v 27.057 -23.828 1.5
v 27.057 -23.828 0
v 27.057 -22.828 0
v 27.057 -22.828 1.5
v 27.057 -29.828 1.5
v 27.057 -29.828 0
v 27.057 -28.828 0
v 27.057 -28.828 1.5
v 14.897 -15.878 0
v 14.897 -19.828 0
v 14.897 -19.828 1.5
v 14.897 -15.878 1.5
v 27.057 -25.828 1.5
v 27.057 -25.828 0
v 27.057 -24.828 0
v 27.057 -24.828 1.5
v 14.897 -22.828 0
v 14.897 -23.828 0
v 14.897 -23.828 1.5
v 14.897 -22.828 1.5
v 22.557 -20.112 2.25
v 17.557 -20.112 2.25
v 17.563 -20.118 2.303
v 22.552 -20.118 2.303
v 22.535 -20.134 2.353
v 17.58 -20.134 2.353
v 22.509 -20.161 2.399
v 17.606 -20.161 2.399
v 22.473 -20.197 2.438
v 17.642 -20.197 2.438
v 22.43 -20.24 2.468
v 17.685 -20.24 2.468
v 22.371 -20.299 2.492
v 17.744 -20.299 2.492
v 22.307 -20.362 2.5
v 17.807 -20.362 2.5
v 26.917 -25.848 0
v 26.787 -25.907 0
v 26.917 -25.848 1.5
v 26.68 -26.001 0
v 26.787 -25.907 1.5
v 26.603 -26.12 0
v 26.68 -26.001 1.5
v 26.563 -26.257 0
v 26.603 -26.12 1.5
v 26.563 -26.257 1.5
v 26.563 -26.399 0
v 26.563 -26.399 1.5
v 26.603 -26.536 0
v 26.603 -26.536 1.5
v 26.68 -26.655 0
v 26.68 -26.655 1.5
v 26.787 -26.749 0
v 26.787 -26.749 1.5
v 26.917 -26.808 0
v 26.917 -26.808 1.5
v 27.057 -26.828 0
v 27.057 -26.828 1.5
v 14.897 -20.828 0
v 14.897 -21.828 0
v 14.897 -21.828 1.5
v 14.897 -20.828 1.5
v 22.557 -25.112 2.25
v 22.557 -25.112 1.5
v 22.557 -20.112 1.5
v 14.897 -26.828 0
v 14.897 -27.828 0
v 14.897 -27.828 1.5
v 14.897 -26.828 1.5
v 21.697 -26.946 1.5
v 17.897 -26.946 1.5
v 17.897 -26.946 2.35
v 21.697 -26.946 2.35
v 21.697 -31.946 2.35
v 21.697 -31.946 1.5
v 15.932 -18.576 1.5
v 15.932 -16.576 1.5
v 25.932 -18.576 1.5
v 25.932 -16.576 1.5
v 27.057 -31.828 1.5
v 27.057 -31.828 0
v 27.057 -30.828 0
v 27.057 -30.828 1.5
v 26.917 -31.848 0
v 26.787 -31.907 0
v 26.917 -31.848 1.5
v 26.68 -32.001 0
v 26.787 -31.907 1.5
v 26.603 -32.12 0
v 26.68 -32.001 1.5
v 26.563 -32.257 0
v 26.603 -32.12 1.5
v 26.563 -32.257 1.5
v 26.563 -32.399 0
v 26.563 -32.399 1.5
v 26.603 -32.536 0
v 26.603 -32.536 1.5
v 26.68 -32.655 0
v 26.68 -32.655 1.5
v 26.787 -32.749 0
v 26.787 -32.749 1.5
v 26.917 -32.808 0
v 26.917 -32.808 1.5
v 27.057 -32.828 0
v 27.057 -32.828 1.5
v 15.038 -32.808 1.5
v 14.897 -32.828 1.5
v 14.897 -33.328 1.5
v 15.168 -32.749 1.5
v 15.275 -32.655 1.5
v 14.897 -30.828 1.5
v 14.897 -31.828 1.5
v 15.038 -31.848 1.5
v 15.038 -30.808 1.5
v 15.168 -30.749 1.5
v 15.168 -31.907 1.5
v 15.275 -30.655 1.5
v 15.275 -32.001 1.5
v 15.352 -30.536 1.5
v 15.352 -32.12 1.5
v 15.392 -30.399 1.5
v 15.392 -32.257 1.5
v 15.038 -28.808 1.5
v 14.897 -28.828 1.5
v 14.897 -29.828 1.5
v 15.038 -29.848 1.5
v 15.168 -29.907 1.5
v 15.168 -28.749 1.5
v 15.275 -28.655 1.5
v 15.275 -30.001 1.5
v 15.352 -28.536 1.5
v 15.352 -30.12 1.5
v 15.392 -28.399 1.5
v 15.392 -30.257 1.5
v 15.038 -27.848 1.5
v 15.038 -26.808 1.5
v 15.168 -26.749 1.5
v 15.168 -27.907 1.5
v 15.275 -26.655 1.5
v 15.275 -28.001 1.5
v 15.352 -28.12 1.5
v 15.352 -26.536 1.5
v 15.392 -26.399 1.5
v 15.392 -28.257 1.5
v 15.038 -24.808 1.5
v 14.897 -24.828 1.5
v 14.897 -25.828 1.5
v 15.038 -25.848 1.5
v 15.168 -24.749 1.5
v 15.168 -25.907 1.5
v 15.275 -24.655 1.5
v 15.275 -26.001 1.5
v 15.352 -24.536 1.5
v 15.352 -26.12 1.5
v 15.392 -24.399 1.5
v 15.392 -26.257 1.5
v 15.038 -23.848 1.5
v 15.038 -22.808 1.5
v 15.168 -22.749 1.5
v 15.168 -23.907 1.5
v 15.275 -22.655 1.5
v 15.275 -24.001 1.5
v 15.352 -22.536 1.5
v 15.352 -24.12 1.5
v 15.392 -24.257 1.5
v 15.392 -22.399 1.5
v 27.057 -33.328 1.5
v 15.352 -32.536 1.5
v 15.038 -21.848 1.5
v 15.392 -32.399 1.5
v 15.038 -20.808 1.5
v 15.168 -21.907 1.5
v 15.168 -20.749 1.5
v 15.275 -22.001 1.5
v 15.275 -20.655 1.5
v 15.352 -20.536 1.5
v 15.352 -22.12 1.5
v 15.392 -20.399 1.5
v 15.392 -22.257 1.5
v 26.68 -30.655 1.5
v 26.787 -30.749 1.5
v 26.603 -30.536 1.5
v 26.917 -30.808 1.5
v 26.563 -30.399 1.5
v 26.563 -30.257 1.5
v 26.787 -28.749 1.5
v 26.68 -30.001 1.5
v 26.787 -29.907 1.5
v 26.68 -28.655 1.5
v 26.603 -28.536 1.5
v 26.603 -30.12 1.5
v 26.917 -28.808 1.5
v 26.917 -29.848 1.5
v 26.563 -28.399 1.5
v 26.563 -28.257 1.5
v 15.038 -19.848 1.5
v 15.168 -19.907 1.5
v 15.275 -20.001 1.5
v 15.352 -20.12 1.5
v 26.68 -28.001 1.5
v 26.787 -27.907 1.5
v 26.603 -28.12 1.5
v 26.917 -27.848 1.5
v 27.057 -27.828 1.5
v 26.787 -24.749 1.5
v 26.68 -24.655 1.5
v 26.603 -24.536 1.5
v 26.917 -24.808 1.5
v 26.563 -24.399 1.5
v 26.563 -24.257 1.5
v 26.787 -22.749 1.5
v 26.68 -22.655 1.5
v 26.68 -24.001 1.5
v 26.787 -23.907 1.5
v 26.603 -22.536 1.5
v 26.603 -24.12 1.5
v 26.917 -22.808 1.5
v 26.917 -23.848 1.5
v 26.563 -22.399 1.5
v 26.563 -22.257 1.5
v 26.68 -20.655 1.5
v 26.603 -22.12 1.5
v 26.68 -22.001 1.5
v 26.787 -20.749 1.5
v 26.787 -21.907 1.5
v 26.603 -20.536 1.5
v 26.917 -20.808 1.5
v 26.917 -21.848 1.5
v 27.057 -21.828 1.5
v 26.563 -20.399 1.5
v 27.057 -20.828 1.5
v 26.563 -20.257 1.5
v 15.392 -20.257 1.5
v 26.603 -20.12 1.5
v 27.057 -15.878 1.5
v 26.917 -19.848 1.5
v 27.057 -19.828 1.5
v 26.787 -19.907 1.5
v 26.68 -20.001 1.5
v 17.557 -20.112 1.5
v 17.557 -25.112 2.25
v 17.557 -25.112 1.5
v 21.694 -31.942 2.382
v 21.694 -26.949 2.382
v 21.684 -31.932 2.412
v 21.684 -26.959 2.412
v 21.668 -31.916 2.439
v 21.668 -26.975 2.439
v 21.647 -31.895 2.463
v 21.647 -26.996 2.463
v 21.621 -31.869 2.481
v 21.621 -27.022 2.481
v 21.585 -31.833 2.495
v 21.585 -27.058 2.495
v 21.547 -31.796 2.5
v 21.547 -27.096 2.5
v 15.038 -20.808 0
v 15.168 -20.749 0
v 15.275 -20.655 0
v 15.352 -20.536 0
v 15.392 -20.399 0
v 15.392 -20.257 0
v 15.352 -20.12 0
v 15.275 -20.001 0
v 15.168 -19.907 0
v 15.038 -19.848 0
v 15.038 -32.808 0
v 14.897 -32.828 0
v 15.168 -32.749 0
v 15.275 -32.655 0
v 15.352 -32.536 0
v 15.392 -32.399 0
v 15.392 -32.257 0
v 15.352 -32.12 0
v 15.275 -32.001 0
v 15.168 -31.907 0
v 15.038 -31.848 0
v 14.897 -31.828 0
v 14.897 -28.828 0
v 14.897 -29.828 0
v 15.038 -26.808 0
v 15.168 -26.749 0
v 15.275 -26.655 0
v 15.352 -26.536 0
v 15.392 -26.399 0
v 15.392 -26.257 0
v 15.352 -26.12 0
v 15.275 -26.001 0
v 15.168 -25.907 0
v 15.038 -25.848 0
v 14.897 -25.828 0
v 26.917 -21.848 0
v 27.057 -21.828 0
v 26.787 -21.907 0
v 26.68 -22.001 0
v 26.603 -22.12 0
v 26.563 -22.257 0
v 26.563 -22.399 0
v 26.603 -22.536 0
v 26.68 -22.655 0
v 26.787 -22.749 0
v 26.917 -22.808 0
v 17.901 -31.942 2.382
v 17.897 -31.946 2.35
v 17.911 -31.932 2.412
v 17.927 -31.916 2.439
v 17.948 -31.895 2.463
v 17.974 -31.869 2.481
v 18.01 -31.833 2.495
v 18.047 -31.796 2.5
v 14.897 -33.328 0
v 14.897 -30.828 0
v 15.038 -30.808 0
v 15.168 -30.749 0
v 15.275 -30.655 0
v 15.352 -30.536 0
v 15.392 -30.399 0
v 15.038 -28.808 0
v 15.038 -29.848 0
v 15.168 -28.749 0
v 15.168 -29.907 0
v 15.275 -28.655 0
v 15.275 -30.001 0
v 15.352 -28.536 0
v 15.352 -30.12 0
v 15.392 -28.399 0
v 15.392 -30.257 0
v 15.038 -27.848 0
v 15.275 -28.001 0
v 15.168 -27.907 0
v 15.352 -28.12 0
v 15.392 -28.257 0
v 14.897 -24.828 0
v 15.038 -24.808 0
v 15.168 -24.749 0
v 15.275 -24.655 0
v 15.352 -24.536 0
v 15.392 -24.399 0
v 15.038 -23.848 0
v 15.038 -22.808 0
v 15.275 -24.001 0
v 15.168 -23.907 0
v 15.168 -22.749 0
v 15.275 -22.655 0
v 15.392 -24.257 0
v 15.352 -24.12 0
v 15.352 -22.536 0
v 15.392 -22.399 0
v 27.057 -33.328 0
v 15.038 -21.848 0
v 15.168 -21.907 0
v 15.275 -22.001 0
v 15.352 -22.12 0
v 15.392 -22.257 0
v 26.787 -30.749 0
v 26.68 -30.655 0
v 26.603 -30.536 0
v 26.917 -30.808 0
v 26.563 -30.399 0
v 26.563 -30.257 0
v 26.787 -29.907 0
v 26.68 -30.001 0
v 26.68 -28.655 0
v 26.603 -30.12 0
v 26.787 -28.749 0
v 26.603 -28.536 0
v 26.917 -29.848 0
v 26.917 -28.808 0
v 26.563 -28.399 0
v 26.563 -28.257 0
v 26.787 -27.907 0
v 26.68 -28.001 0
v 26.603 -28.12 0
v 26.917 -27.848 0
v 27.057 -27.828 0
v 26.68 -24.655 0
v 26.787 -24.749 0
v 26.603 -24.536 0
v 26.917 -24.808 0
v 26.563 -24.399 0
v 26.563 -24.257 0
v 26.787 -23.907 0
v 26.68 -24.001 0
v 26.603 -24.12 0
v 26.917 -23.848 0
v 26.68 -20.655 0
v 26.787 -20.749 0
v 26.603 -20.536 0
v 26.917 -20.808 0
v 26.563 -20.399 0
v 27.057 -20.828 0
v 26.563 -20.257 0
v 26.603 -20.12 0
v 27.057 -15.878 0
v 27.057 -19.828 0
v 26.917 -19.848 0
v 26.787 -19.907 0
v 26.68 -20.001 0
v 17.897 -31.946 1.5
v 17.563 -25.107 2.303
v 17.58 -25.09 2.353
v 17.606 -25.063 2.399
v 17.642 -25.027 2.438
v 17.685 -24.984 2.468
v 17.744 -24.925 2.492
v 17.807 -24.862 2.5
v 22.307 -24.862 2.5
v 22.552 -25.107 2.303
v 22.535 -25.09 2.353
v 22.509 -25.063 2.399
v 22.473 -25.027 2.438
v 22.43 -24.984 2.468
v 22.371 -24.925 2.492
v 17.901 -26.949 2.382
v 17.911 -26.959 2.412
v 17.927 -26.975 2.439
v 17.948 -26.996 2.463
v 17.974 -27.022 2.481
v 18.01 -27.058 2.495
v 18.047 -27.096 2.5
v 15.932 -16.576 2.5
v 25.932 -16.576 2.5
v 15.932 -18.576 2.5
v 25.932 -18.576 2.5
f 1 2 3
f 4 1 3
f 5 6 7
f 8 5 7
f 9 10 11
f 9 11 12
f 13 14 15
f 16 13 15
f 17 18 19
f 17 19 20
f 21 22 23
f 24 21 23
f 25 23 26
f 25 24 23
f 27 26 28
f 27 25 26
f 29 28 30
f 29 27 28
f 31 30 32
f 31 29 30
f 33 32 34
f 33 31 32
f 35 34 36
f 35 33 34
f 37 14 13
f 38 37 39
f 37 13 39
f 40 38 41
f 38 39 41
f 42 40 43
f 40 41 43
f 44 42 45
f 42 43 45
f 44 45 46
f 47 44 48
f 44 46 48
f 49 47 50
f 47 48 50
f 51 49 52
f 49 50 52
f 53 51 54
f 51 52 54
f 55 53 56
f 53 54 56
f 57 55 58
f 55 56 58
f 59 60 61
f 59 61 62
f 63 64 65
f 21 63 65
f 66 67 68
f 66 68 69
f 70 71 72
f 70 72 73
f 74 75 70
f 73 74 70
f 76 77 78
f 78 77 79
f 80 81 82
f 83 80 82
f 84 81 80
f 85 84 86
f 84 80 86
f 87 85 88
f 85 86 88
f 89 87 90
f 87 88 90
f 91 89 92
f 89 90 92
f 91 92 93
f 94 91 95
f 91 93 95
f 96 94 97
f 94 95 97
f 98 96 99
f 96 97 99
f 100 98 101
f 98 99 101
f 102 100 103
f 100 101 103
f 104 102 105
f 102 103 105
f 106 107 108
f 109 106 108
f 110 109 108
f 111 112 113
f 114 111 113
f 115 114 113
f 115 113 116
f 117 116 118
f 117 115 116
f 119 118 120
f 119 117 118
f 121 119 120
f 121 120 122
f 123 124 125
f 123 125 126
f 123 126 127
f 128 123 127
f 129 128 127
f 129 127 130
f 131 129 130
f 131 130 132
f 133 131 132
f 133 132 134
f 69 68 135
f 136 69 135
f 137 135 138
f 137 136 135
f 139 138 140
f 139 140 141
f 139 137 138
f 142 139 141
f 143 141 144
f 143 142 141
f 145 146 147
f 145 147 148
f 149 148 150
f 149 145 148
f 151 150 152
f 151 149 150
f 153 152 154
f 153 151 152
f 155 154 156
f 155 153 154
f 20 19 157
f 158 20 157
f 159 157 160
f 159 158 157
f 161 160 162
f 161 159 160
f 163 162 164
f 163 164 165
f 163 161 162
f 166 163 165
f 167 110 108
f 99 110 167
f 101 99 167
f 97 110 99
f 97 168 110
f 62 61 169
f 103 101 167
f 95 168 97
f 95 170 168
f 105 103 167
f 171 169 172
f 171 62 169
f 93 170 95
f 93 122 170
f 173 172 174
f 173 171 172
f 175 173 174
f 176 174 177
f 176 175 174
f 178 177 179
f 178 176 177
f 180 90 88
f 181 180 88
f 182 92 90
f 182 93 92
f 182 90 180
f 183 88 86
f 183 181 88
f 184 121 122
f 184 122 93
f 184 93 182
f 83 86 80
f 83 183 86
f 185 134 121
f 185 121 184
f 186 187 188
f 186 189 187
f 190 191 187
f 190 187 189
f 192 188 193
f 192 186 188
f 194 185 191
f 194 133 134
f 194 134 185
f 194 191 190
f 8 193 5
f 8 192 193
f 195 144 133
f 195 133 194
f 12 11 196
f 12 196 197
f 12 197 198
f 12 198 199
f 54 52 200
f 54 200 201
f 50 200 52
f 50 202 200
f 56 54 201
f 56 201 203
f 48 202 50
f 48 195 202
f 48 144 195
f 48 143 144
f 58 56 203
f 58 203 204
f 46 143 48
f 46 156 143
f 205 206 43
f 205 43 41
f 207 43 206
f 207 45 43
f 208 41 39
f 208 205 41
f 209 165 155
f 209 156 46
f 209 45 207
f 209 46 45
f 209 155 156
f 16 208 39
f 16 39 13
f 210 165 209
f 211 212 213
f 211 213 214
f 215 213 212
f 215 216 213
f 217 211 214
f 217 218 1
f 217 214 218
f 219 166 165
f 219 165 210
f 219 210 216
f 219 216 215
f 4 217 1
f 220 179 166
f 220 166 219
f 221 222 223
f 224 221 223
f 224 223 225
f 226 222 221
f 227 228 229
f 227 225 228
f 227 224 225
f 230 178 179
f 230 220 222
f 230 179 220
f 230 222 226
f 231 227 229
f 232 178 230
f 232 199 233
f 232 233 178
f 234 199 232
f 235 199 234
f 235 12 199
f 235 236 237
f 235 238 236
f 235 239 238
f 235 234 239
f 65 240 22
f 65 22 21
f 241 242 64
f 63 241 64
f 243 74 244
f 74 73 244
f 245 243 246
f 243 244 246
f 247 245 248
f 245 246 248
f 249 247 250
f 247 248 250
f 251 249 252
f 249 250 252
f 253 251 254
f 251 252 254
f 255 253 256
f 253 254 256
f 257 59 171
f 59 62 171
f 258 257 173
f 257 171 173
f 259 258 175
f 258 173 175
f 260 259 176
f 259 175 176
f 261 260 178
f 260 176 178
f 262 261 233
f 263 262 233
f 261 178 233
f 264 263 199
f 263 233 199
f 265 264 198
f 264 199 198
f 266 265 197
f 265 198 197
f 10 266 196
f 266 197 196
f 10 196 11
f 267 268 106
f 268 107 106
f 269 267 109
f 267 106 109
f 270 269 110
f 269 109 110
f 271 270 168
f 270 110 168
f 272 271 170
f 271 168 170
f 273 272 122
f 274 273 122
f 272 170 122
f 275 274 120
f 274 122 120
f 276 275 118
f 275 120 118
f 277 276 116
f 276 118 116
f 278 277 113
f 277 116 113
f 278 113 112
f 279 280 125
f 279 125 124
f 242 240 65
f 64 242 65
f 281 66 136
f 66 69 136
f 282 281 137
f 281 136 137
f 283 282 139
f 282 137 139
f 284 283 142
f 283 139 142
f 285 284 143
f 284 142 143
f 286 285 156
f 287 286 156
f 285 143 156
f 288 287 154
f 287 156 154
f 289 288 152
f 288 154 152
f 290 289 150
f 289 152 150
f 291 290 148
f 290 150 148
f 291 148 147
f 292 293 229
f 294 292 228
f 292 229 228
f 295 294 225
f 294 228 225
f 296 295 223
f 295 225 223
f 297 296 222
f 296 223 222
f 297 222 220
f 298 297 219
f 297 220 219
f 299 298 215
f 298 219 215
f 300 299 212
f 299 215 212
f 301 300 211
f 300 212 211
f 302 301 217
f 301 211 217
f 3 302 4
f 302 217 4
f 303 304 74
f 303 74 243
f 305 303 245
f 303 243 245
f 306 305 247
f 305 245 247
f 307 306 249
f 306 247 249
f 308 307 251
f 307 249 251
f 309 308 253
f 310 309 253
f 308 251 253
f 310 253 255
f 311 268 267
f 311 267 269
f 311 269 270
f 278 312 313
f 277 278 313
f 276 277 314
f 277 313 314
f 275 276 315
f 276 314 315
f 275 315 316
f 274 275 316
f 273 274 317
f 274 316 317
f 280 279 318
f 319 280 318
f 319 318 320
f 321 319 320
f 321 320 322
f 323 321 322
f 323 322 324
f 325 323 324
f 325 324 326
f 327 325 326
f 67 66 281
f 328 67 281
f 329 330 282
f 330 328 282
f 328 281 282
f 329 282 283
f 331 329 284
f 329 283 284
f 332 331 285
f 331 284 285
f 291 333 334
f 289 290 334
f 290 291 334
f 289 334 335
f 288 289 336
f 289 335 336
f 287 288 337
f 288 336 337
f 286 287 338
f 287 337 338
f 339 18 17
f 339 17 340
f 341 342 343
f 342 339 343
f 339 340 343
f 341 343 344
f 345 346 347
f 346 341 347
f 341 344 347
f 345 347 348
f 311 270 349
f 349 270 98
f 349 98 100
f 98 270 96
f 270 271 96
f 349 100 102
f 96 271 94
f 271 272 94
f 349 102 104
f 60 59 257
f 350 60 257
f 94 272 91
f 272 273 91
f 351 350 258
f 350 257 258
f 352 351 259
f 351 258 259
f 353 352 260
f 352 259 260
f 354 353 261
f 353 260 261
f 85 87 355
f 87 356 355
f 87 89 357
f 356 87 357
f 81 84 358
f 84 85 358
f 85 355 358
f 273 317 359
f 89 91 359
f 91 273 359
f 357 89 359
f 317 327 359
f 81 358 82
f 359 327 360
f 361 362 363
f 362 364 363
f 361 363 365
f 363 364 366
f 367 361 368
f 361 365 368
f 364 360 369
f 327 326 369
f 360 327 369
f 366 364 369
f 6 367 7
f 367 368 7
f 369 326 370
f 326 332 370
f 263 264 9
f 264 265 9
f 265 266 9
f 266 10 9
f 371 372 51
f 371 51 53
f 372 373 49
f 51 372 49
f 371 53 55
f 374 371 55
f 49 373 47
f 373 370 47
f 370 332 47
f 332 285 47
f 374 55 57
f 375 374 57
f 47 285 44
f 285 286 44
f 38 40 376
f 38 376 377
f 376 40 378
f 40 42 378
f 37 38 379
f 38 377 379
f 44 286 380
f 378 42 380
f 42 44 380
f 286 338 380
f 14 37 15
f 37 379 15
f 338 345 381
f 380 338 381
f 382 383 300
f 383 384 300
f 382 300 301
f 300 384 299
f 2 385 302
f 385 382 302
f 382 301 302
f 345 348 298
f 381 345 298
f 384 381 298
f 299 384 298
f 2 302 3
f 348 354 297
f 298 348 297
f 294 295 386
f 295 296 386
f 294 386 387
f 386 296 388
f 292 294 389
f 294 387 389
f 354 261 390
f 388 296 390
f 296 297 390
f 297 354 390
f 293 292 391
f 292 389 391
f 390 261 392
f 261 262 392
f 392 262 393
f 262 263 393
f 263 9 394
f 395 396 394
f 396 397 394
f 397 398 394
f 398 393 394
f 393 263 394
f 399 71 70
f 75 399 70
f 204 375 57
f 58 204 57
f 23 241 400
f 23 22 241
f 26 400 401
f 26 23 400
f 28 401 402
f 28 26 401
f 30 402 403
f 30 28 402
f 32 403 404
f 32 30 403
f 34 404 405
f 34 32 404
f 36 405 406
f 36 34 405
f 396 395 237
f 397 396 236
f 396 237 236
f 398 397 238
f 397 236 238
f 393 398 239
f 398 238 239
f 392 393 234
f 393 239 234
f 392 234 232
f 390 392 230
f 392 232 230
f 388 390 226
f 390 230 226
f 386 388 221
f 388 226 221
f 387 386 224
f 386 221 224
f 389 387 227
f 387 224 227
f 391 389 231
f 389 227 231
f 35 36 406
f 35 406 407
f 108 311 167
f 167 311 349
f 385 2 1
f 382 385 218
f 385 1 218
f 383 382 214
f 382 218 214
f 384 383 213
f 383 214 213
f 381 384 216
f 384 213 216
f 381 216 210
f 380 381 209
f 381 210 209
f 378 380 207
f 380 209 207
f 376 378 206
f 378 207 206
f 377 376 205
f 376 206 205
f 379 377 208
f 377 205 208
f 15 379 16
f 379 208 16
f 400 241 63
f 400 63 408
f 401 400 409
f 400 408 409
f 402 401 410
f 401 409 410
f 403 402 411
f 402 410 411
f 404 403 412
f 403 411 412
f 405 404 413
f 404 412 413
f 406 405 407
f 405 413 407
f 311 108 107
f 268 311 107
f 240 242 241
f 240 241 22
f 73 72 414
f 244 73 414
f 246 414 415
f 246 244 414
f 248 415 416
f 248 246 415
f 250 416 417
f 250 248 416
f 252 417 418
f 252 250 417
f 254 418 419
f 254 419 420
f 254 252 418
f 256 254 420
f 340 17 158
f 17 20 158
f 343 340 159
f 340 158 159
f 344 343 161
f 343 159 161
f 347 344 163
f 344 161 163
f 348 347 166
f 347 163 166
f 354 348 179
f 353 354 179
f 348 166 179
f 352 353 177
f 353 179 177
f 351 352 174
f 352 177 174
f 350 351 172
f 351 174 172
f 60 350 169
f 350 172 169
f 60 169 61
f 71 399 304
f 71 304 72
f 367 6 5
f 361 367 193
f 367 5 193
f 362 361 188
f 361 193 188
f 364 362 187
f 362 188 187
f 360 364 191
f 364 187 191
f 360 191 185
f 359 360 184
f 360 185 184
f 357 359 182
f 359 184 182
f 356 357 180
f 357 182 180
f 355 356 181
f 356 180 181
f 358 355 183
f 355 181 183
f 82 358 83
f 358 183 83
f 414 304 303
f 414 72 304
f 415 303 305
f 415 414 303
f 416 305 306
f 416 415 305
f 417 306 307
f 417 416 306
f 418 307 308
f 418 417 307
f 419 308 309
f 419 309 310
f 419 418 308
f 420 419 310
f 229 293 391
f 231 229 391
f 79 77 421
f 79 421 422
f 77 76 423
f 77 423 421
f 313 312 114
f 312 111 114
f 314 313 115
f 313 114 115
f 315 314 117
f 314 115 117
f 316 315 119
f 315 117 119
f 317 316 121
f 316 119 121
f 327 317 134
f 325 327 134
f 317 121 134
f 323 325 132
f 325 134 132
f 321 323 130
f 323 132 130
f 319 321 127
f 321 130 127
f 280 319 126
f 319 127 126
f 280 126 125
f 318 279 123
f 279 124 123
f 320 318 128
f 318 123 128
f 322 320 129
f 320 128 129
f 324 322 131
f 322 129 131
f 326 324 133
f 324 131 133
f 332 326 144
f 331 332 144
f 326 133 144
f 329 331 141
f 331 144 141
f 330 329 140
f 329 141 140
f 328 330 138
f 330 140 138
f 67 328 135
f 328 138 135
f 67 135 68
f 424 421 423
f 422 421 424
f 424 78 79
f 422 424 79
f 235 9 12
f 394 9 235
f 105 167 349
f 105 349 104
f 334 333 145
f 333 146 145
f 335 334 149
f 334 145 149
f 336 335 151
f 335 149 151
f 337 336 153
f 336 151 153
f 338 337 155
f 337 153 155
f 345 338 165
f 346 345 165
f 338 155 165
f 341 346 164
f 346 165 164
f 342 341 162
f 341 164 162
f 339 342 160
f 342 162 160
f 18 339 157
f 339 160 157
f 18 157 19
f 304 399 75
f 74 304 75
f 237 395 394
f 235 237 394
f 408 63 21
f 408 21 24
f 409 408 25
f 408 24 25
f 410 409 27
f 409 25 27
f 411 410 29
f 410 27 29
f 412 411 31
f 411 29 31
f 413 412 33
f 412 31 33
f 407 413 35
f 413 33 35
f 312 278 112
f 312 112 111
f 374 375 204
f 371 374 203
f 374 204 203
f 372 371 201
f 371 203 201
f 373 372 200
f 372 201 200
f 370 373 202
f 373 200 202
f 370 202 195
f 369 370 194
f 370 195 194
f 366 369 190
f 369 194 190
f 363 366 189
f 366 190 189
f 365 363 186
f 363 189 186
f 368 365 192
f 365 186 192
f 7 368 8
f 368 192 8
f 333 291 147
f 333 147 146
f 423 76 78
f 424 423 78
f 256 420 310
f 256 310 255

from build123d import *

# Parameters (mm, degrees)
F0_W     = 12.16
F0_H     = 17.45
F1_DEPTH = 1.5
F3_R     = 0.5
F4_DEPTH = 1.501
F2_W     = 5
F2_H     = 5
F2_W_2   = 3.8
F2_W_3   = 10
F2_H_2   = 2
F5_DEPTH = 1
F6_R     = 0.25
F7_R     = 0.15


with BuildPart() as f1:
    # F0 (on Top) → F1 (new body)
    with BuildSketch(Plane.XY):
        with Locations((20.977421, -24.602963)):
            Rectangle(F0_W, F0_H)
    extrude(amount=F1_DEPTH)

    # F3 (on face) → F4 (cut, through all)
    with BuildSketch(Plane.XY.offset(1.5)):
        with Locations((14.897421, -32.327963)):
            Circle(F3_R)
        with Locations((27.057421, -32.327963)):
            Circle(F3_R)
        with Locations((14.897421, -30.327963)):
            Circle(F3_R)
        with Locations((27.057421, -30.327963)):
            Circle(F3_R)
        with Locations((14.897421, -28.327963)):
            Circle(F3_R)
        with Locations((27.057421, -28.327963)):
            Circle(F3_R)
        with Locations((14.897421, -26.327963)):
            Circle(F3_R)
        with Locations((27.057421, -26.327963)):
            Circle(F3_R)
        with Locations((14.897421, -24.327963)):
            Circle(F3_R)
        with Locations((27.057421, -24.327963)):
            Circle(F3_R)
        with Locations((14.897421, -22.327963)):
            Circle(F3_R)
        with Locations((27.057421, -22.327963)):
            Circle(F3_R)
        with Locations((14.897421, -20.327963)):
            Circle(F3_R)
        with Locations((27.057421, -20.327963)):
            Circle(F3_R)
    extrude(amount=-F4_DEPTH, mode=Mode.SUBTRACT)


with BuildPart() as f5:
    # F2 (on face) → F5 (new body)
    with BuildSketch(Plane.XY.offset(1.5)):
        with Locations((20.057421, -22.612158)):
            Rectangle(F2_W, F2_H)
        with Locations((19.797421, -29.445597)):
            Rectangle(F2_W_2, F2_H)
        with Locations((20.931646, -17.576346)):
            Rectangle(F2_W_3, F2_H_2)
    extrude(amount=F5_DEPTH)

    # F6
    f6_edges = [f5.edges().sort_by_distance(p)[0] for p in [
        (17.557421, -22.612158, 2.5),
        (20.057421, -25.112158, 2.5),
        (22.557421, -22.612158, 2.5),
        (20.057421, -20.112158, 2.5),
    ]]
    fillet(f6_edges, radius=F6_R)

    # F7
    f7_edges = [f5.edges().sort_by_distance(p)[0] for p in [
        (17.897421, -29.445597, 2.5),
        (19.797421, -31.945597, 2.5),
        (21.697421, -29.445597, 2.5),
        (19.797421, -26.945597, 2.5),
    ]]
    fillet(f7_edges, radius=F7_R)


solid = Compound([f1.part, f5.part])
